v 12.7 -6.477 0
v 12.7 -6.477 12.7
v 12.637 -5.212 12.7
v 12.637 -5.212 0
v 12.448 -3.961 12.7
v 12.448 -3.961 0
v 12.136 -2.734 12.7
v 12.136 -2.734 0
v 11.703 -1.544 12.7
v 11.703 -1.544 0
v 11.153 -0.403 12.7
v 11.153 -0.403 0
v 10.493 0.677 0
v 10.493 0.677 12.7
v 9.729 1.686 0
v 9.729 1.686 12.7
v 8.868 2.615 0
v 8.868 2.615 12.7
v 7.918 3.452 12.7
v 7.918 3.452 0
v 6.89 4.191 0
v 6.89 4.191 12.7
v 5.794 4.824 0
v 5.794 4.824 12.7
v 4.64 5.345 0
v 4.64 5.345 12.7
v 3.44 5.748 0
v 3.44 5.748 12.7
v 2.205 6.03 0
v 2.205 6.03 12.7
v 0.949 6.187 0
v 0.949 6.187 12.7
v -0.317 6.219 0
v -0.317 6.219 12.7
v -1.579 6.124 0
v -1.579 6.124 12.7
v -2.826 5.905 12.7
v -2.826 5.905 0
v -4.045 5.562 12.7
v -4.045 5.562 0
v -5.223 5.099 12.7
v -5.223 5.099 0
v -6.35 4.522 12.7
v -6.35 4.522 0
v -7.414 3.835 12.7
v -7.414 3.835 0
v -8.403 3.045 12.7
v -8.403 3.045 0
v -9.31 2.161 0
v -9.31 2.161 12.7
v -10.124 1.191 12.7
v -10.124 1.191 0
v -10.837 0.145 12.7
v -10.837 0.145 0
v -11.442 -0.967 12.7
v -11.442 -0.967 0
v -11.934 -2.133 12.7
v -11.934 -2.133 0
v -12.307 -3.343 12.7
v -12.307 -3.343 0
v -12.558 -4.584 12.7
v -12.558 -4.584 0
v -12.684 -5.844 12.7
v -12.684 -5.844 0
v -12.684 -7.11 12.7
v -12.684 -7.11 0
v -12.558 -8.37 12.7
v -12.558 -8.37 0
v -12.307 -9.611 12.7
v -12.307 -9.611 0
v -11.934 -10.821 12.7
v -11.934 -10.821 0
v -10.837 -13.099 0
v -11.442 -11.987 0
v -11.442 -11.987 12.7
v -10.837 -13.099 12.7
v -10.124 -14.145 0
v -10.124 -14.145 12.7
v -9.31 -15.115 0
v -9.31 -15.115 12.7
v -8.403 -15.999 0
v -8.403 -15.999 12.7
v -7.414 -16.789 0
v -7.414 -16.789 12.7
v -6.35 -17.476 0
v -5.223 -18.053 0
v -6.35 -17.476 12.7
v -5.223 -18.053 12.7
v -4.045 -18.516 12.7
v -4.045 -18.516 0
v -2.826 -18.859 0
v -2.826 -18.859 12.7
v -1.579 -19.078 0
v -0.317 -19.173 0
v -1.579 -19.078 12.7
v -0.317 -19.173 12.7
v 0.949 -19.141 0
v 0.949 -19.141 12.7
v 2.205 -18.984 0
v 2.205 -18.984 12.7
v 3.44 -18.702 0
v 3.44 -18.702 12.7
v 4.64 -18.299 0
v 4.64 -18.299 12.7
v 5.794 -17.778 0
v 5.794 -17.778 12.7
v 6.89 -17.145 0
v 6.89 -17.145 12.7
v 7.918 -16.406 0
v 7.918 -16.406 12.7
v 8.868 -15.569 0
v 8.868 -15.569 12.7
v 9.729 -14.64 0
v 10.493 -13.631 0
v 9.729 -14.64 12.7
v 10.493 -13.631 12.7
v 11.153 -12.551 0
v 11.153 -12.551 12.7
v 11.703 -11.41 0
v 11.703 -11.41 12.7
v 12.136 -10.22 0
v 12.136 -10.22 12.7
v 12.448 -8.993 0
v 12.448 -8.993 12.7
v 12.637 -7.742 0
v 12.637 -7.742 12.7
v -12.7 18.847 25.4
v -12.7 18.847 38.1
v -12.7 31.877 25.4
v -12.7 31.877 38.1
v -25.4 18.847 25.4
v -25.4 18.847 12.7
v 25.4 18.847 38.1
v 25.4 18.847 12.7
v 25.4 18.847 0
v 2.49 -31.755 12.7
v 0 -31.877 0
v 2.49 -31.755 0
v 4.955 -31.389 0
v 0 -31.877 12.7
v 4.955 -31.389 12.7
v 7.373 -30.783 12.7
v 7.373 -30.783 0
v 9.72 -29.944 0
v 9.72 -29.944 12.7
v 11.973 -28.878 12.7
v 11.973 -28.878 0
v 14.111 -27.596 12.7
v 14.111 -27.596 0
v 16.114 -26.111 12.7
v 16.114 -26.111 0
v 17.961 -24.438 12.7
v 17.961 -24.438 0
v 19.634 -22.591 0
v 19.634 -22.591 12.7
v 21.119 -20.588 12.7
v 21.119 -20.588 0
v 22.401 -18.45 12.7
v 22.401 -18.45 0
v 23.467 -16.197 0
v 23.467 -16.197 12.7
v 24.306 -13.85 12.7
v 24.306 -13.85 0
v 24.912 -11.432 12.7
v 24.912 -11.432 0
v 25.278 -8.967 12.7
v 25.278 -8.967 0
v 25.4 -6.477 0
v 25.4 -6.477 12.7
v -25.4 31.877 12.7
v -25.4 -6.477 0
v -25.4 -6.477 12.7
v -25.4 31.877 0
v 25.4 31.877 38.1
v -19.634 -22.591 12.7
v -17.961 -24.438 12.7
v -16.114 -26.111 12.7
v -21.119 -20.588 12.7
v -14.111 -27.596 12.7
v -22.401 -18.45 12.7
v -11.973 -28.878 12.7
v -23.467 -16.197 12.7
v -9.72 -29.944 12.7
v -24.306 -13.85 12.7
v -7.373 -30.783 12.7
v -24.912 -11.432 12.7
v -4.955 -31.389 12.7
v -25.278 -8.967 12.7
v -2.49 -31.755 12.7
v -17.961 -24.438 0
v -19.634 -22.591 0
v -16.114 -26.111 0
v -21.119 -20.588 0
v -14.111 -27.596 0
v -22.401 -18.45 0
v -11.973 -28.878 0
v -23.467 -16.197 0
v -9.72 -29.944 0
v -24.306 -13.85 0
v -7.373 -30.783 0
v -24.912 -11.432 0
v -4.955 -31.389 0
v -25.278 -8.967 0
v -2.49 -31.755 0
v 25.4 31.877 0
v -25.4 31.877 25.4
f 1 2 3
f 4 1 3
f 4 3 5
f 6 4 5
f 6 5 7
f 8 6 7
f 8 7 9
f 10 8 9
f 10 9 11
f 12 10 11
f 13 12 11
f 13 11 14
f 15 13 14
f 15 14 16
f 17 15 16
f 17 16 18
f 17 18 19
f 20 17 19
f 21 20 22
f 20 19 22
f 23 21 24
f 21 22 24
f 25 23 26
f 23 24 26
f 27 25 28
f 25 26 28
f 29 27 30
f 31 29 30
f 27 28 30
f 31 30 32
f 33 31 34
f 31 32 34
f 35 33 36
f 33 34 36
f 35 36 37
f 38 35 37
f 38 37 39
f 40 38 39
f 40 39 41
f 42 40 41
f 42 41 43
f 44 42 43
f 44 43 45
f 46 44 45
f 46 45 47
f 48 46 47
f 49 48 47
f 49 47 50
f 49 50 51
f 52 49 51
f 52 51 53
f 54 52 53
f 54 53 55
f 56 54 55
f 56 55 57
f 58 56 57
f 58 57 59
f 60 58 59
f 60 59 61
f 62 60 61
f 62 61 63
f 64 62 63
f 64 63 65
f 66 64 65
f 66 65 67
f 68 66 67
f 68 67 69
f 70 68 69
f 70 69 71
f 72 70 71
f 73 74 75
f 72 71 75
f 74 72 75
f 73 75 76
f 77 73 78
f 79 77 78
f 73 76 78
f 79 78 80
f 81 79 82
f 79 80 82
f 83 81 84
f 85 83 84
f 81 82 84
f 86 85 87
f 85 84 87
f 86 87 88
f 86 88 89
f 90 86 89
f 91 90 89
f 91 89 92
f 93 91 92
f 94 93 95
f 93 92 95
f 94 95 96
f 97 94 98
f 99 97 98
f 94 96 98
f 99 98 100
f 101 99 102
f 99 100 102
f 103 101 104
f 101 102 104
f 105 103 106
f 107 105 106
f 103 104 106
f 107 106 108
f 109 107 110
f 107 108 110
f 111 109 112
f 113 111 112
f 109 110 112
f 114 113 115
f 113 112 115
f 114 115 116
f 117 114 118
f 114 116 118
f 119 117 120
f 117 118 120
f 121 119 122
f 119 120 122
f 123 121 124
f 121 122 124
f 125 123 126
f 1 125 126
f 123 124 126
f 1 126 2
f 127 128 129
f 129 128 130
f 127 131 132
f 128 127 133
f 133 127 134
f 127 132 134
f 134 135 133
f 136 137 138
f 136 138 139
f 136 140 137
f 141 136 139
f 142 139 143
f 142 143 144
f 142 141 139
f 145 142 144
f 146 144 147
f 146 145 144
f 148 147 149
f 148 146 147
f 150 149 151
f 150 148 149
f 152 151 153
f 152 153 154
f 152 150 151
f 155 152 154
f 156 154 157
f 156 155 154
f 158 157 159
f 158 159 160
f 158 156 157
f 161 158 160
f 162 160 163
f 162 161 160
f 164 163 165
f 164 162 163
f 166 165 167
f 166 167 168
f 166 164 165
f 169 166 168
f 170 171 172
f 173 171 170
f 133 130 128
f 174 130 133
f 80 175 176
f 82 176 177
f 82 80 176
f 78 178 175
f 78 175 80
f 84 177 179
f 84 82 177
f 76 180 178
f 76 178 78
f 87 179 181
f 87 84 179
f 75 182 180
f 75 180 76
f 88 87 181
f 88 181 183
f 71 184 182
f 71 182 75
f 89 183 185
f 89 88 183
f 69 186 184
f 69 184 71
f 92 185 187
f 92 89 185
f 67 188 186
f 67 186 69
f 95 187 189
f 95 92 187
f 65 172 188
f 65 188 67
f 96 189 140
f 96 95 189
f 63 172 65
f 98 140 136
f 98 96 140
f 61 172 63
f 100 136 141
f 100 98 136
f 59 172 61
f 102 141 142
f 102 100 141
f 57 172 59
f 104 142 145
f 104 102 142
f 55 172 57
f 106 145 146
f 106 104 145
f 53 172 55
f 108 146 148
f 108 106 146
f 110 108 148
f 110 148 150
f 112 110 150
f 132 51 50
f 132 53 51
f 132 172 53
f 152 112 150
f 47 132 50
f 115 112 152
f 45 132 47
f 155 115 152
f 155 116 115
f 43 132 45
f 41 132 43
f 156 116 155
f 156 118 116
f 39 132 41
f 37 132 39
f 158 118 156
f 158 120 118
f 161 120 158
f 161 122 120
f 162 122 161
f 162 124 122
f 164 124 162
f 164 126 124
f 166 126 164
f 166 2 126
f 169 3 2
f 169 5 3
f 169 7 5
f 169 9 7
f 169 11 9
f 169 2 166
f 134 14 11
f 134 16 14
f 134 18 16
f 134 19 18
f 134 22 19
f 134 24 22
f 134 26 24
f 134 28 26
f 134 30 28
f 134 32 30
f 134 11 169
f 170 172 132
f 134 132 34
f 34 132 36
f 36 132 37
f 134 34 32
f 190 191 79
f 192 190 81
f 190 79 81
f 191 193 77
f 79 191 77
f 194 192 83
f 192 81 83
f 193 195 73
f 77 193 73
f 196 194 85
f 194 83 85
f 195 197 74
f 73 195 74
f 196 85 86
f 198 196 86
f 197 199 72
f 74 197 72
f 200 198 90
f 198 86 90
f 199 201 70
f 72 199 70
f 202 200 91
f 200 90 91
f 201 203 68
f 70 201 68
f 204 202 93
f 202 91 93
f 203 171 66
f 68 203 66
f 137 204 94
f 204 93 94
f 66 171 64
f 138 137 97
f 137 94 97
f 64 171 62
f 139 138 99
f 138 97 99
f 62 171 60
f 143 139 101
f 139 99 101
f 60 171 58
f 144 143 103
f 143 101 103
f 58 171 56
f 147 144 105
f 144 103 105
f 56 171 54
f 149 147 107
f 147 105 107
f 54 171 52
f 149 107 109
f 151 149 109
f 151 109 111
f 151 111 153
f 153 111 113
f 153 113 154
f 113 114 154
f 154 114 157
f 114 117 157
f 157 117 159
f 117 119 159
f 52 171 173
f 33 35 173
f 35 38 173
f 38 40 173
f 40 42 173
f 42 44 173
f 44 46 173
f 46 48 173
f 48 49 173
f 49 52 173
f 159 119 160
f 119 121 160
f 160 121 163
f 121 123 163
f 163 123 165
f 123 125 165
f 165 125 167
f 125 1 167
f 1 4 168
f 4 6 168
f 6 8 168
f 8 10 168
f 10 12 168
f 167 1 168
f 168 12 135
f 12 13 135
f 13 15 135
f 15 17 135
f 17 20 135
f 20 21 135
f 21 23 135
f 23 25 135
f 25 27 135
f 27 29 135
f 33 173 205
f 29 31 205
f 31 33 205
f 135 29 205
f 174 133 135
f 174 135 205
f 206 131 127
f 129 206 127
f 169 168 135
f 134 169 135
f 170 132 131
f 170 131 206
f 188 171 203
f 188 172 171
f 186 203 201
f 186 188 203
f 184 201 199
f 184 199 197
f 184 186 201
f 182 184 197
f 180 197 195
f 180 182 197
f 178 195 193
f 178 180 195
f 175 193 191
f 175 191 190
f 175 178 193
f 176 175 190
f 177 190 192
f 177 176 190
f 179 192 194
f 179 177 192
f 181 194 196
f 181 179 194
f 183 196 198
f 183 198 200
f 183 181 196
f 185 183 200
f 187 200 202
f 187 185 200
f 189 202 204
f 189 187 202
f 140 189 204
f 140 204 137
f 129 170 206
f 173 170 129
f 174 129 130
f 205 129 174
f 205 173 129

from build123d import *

# Parameters (mm, degrees)
F0_W     = 50.8
F0_H     = 63.754
F1_DEPTH = 12.7
F2_W     = 50.8
F2_H     = 13.0302
F3_DEPTH = 38.1
F4_W     = 12.7
F4_H     = 13.0302
F5_DEPTH = 12.7
F6_R     = 25.39999
F7_R     = 12.7
F8_DEPTH = 12.701


# Not quite as in the source:
# - a fillet or chamfer is up to 0.001 mm smaller than in the source, because OpenCascade refuses the exact size


with BuildPart() as f1:
    # F0 (on Top) → F1 (new body)
    with BuildSketch(Plane.XY):
        Rectangle(F0_W, F0_H)
    extrude(amount=F1_DEPTH)

    # F2 (on Top) → F3 (join)
    with BuildSketch(Plane.XY):
        with Locations((1.8626e-06, 25.3619)):
            Rectangle(F2_W, F2_H)
    extrude(amount=F3_DEPTH)

    # F4 (on face) → F5 (cut)
    with BuildSketch(Plane.XY.offset(38.1)):
        with Locations((-19.0499981374, 25.3619)):
            Rectangle(F4_W, F4_H)
    extrude(amount=-F5_DEPTH, mode=Mode.SUBTRACT)

    # F6 (radius 25.4 in the source; OpenCascade refuses exactly that, so slightly less here)
    f6_edges = [f1.edges().sort_by_distance(p)[0] for p in [
        (-25.4, -31.877, 6.35),
        (25.4, -31.877, 6.35),
    ]]
    fillet(f6_edges, radius=F6_R)

    # F7 (on face) → F8 (cut, through all)
    with BuildSketch(Plane.XY.offset(12.7)):
        with Locations((0, -6.477)):
            Circle(F7_R)
    extrude(amount=-F8_DEPTH, mode=Mode.SUBTRACT)


solid = f1.part
